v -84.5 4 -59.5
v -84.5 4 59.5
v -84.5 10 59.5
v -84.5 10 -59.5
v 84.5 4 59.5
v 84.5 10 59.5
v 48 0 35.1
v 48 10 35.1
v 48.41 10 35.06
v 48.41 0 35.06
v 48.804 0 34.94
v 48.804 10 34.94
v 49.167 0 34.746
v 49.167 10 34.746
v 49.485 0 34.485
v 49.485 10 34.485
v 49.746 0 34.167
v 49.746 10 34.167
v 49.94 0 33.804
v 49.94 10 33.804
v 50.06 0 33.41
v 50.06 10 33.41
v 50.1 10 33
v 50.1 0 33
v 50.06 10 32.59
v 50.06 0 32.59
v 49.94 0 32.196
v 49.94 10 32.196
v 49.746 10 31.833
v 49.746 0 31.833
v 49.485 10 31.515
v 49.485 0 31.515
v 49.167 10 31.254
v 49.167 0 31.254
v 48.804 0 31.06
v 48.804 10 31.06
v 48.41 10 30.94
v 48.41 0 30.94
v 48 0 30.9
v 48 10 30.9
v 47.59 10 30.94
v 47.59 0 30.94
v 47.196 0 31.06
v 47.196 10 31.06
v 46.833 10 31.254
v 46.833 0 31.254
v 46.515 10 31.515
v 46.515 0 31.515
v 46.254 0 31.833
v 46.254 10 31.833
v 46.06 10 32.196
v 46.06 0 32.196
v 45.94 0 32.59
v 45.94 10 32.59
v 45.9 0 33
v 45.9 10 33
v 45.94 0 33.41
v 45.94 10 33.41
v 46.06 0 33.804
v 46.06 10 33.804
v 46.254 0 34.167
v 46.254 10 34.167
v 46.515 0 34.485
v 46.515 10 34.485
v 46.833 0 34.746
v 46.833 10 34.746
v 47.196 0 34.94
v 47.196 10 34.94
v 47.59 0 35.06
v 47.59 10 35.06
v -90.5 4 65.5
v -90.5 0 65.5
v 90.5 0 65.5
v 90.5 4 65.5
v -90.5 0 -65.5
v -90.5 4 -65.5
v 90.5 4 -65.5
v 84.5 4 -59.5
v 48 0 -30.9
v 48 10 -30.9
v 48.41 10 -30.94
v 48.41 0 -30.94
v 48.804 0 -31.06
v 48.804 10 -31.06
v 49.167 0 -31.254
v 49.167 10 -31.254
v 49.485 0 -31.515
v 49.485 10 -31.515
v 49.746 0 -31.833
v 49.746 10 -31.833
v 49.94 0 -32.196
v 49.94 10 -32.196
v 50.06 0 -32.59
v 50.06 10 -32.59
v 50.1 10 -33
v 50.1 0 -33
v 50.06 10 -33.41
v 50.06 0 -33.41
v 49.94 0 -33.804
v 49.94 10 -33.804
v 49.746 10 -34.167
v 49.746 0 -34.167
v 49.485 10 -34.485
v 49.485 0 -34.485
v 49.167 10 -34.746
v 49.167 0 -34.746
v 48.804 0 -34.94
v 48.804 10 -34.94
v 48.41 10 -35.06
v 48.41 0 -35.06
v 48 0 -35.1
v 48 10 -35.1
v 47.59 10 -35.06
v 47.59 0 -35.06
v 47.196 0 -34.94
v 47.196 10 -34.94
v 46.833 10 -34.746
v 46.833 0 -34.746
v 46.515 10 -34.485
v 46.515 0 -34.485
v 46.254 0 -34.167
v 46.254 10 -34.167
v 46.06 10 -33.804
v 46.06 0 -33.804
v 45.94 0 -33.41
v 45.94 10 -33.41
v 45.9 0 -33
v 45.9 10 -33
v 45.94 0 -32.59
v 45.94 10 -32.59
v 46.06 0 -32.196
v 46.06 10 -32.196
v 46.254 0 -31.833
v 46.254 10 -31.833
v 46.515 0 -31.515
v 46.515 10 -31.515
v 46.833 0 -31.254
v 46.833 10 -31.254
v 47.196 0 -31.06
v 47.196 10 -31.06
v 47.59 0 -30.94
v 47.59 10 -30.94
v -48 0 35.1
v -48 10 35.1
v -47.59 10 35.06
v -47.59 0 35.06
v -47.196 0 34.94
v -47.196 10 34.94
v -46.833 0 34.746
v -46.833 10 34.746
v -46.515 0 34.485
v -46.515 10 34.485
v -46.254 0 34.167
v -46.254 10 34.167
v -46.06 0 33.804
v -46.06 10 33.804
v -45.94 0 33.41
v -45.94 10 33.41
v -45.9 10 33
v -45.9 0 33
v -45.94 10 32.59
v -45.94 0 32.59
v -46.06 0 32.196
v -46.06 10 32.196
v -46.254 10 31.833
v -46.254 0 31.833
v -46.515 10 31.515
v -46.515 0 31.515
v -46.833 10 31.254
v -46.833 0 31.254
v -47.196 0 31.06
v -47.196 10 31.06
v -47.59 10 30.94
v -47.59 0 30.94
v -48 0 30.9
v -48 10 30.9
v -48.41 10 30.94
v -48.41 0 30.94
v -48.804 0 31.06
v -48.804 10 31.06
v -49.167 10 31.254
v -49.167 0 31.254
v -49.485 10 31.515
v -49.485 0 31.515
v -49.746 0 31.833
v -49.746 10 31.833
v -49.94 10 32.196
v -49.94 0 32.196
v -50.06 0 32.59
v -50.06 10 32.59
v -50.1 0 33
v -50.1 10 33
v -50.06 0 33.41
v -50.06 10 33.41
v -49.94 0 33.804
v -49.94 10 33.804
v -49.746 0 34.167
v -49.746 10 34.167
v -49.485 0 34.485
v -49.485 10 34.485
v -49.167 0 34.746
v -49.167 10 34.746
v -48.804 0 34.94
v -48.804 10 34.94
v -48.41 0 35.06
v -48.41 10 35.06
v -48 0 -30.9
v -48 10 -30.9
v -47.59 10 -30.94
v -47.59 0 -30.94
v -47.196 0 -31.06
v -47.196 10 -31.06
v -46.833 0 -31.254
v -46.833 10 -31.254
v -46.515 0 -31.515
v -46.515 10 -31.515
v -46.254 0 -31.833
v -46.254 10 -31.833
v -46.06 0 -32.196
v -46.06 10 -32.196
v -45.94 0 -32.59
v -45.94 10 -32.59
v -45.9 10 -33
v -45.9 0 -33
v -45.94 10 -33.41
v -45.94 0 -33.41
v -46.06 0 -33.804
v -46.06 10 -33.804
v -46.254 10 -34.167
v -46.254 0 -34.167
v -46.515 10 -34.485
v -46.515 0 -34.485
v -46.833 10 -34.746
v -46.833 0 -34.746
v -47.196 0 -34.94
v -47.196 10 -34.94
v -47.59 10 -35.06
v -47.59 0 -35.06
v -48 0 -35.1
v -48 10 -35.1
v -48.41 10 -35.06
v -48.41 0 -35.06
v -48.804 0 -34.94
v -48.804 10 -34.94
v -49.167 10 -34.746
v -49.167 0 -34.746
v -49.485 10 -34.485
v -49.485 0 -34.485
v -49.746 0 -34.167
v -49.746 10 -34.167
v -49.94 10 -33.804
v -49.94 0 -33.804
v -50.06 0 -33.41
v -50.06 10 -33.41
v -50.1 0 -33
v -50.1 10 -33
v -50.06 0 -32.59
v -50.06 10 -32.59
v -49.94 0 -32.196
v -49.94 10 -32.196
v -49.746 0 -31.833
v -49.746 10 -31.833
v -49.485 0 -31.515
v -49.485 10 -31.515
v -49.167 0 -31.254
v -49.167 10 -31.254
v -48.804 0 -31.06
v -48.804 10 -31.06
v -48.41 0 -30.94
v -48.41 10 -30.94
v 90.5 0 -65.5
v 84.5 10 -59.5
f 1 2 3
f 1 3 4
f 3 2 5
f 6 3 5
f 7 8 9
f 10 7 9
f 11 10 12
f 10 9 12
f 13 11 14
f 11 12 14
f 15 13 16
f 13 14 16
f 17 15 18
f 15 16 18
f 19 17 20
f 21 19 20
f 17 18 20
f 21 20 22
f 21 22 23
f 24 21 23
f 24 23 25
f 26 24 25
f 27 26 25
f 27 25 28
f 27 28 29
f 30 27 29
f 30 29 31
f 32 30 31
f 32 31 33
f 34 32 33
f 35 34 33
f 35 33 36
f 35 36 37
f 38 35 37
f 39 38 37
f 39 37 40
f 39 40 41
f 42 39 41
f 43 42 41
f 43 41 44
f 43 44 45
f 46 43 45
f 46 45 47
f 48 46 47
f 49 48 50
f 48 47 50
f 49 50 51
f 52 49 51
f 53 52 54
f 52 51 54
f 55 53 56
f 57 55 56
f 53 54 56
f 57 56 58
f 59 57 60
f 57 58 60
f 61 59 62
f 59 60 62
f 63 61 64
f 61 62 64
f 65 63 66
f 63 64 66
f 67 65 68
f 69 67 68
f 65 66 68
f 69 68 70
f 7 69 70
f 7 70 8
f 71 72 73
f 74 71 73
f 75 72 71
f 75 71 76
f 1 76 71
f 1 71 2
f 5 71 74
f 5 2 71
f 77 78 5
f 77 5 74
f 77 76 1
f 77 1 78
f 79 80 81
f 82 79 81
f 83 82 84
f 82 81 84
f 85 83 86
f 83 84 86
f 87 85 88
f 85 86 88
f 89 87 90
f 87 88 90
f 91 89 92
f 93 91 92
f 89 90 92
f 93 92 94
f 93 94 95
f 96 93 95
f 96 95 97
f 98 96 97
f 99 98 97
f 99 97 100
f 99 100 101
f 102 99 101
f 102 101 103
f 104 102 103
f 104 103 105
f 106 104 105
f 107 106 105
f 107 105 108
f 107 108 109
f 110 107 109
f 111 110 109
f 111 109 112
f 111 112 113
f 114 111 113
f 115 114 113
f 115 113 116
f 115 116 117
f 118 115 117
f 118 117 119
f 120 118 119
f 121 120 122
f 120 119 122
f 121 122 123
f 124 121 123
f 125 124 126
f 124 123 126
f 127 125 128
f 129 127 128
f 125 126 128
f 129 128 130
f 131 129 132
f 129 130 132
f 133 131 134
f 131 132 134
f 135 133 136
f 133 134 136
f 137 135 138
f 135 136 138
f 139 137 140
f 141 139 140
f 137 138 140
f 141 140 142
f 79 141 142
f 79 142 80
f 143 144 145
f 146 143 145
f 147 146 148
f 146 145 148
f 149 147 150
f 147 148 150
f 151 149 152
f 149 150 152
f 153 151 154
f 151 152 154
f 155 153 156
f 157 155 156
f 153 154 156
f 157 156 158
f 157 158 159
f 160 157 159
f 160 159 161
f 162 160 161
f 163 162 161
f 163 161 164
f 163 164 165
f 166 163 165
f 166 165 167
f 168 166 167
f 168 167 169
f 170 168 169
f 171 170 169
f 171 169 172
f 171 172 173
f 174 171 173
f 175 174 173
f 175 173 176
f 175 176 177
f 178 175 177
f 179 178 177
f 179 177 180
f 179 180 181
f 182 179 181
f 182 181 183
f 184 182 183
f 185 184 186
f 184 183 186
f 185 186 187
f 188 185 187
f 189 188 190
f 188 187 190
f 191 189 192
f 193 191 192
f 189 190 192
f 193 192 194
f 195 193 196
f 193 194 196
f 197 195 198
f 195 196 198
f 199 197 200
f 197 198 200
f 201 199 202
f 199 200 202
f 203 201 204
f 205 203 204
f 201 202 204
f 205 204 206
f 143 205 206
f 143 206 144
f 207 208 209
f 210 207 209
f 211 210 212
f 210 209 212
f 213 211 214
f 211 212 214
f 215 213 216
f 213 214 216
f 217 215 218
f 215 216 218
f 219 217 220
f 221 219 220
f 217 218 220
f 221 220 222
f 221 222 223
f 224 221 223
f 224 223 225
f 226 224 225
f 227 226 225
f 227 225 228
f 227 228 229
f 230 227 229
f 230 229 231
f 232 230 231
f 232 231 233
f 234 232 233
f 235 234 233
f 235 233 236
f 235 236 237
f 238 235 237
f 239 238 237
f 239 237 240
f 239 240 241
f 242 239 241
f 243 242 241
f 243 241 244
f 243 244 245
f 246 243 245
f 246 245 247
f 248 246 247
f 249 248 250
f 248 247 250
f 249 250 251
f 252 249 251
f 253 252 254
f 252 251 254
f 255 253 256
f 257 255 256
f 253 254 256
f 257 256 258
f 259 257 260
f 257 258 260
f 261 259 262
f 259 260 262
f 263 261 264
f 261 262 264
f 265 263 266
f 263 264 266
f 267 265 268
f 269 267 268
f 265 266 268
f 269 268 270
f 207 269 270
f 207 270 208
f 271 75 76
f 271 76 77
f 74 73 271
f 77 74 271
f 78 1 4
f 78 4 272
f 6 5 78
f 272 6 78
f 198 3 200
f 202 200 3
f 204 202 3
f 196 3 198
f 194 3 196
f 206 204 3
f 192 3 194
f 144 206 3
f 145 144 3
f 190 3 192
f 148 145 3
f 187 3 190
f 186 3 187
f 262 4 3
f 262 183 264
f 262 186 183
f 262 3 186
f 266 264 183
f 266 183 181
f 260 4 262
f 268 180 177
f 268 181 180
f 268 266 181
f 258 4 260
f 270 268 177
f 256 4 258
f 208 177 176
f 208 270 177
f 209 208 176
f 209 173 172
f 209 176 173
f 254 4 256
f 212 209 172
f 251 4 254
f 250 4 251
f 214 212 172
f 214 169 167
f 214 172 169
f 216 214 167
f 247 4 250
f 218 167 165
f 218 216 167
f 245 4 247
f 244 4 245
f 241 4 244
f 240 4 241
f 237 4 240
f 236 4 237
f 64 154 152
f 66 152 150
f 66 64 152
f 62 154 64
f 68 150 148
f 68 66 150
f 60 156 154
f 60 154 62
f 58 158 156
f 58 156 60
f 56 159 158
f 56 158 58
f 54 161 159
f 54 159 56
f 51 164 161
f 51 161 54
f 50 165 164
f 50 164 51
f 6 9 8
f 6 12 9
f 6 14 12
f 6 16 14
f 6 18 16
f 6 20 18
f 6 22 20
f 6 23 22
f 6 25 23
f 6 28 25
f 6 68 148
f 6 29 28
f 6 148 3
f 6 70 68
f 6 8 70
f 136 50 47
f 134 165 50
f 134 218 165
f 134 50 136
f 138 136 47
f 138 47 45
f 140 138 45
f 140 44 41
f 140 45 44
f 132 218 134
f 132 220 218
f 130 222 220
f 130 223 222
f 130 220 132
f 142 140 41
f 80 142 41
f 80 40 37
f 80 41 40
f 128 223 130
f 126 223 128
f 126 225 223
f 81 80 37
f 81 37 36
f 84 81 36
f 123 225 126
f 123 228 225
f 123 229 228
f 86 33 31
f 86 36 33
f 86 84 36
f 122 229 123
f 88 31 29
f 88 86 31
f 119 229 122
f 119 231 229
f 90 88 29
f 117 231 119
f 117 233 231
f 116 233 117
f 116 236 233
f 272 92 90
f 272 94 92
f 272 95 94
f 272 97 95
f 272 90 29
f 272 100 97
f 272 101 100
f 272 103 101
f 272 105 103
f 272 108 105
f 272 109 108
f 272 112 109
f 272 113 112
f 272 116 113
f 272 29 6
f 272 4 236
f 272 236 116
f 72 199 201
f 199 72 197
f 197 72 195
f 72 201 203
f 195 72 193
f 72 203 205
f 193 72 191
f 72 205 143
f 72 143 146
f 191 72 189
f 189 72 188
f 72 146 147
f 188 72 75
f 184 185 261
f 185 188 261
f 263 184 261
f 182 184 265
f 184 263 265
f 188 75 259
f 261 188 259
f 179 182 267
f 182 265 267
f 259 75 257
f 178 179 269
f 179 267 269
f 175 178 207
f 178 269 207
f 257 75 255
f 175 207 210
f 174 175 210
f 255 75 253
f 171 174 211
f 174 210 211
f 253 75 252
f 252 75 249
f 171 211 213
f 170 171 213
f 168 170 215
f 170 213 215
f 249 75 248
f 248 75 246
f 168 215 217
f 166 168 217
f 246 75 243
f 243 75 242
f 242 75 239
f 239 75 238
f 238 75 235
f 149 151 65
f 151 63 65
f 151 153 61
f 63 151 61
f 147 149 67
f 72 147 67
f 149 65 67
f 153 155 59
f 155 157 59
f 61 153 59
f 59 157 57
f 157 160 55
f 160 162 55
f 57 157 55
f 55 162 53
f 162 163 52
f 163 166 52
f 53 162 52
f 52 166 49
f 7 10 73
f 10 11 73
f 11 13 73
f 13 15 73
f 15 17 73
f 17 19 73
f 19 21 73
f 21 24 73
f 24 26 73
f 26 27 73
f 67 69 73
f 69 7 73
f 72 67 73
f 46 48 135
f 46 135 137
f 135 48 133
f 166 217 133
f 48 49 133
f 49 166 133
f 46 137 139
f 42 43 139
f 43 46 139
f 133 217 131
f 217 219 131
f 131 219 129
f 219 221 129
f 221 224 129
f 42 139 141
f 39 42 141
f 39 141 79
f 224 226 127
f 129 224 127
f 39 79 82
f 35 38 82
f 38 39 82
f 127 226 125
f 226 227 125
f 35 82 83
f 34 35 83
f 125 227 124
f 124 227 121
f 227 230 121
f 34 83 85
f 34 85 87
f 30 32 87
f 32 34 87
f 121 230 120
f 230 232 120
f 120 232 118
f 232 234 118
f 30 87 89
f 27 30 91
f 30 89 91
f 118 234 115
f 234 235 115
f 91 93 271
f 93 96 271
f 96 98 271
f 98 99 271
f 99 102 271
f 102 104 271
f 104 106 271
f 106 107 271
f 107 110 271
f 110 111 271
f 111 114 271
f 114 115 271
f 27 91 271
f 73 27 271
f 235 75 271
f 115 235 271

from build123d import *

# Parameters (mm, degrees)
ESQUISSE1_W             = 169
ESQUISSE1_H             = 119
BOSS_EXTRU_1_DEPTH      = 10
ESQUISSE2_W             = 181
ESQUISSE2_H             = 131
BOSS_EXTRU_2_DEPTH      = 4
ESQUISSE3_R             = 2.1
ENL_V_MAT_EXTRU_1_DEPTH = 113.162828067


with BuildPart() as part:
    # Esquisse1 → Boss.-Extru.1 (new body)
    with BuildSketch(Plane(origin=(0, 0, 0), x_dir=(1, 0, 0), z_dir=(0, 1, 0))):
        Rectangle(ESQUISSE1_W, ESQUISSE1_H)
    extrude(amount=BOSS_EXTRU_1_DEPTH)

    # Esquisse2 → Boss.-Extru.2 (add)
    with BuildSketch(Plane(origin=(0, 0, 0), x_dir=(1, 0, 0), z_dir=(0, 1, 0))):
        Rectangle(ESQUISSE2_W, ESQUISSE2_H)
    extrude(amount=BOSS_EXTRU_2_DEPTH)

    # Esquisse3 → Enlèv. mat.-Extru.1 (cut, through all)
    with BuildSketch(Plane(origin=(0, 10, 0), x_dir=(1, 0, 0), z_dir=(0, 1, 0))):
        with Locations(Location((-48, 33, 0), (0, 0, 270))):
            Circle(ESQUISSE3_R)
        with Locations(Location((48, 33, 0), (0, 0, 270))):
            Circle(ESQUISSE3_R)
        with Locations(Location((48, -33, 0), (0, 0, 270))):
            Circle(ESQUISSE3_R)
        with Locations(Location((-48, -33, 0), (0, 0, 270))):
            Circle(ESQUISSE3_R)
    extrude(amount=-ENL_V_MAT_EXTRU_1_DEPTH, mode=Mode.SUBTRACT)


solid = part.part
